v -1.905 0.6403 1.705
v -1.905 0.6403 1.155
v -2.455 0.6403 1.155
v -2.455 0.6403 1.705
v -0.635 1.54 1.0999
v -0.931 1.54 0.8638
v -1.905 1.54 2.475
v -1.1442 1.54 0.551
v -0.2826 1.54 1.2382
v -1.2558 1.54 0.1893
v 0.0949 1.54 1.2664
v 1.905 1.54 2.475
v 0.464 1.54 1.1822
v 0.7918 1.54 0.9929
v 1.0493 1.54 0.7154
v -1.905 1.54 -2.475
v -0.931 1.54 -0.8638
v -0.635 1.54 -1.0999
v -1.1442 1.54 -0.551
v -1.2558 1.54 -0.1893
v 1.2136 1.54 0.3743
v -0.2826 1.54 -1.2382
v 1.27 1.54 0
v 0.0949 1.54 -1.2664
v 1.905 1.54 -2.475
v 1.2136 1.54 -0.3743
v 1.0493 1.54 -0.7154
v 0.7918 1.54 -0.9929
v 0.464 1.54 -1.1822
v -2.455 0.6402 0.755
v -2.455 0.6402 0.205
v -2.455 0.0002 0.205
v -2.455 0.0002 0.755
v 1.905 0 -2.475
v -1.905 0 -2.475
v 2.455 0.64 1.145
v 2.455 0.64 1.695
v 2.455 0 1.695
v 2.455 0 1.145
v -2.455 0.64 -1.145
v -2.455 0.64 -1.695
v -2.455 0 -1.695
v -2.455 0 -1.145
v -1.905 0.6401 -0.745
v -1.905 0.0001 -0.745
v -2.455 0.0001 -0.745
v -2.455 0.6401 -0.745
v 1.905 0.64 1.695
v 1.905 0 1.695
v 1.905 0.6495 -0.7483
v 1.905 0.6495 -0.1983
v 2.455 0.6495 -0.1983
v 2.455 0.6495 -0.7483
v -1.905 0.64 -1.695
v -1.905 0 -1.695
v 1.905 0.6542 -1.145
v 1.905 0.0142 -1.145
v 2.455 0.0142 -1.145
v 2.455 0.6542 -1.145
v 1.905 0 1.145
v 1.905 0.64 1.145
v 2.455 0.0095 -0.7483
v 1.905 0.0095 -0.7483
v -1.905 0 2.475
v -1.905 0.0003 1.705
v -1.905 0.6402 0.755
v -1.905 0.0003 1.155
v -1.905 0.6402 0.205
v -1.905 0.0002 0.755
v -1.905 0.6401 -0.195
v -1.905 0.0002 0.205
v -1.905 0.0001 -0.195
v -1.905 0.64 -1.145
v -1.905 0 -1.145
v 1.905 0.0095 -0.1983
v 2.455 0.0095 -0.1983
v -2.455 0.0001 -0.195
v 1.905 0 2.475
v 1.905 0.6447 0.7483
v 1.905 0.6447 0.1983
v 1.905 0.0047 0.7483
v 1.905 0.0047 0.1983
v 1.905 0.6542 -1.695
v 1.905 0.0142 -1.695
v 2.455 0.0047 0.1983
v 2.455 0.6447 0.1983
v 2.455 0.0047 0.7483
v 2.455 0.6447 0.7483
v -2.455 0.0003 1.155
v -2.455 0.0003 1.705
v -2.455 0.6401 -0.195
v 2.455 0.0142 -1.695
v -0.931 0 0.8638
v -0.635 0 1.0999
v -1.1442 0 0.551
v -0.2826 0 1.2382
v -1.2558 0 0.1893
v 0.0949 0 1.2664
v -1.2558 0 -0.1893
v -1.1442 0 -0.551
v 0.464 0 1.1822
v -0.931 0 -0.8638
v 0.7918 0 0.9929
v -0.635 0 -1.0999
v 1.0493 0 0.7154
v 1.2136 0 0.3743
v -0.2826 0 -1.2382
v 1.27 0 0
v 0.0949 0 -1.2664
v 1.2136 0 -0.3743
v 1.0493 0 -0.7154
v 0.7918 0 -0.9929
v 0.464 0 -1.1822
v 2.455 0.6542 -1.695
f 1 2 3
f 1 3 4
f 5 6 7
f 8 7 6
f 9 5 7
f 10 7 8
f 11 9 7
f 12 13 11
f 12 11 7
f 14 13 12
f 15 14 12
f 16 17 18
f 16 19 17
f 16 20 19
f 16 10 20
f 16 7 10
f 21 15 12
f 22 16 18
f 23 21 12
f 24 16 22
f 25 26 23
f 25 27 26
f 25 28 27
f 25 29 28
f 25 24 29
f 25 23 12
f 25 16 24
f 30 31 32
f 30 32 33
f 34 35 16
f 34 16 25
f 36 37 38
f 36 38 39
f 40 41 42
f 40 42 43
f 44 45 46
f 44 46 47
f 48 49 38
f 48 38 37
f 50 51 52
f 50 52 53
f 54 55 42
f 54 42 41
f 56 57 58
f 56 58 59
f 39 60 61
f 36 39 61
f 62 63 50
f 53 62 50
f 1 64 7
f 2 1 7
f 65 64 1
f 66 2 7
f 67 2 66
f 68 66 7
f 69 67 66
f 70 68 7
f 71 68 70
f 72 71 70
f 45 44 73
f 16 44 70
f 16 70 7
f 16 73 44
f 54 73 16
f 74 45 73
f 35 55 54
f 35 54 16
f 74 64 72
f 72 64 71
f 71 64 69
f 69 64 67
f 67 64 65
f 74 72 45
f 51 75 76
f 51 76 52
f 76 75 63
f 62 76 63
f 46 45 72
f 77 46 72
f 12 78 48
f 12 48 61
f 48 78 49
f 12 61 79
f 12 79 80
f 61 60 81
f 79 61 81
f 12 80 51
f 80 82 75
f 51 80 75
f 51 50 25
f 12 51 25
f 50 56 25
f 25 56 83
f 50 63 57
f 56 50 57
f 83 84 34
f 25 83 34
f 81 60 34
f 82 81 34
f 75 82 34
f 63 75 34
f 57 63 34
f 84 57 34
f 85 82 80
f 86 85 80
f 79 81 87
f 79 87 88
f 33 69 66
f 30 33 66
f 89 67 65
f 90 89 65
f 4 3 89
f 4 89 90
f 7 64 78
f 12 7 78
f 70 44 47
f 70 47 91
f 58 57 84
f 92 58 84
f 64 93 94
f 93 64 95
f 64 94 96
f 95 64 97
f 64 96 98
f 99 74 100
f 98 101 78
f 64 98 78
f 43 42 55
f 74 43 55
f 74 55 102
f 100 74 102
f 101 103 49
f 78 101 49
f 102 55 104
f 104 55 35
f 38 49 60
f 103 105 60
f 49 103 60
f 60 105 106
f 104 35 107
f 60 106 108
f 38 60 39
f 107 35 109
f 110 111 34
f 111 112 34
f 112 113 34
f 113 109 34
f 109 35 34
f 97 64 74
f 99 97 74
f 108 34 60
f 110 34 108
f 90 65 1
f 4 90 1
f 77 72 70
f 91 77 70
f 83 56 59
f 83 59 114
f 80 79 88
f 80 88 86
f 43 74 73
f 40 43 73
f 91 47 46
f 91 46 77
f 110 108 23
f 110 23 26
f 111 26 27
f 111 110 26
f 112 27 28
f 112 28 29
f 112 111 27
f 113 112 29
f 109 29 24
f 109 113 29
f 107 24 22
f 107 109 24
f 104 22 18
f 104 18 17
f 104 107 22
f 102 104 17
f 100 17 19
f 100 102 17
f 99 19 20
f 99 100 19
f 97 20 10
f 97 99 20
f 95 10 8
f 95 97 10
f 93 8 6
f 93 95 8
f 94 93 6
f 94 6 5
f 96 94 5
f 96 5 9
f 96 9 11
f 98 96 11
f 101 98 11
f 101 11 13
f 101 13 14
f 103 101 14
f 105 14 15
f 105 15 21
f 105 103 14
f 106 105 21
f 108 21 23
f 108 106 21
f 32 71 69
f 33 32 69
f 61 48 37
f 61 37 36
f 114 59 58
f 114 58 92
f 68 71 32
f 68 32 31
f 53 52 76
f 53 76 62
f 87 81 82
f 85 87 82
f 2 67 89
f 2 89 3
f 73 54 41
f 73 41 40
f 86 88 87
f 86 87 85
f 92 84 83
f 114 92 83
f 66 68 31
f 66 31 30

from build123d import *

# Parameters (mm, degrees)
SKETCH1_W           = 3.81
SKETCH1_H           = 4.95
SKETCH1_R           = 1.27
BOSS_EXTRUDE1_DEPTH = 1.54
SKETCH2_W           = 0.55
SKETCH2_H           = 0.64
BOSS_EXTRUDE2_DEPTH = 0.55
SKETCH4_W           = 0.55
SKETCH4_H           = 0.64
BOSS_EXTRUDE3_DEPTH = 0.55


with BuildPart() as part:
    # Sketch1 → Boss-Extrude1 (new body)
    with BuildSketch(Plane(origin=(0, 0, 0), x_dir=(1, 0, 0), z_dir=(0, 1, 0))):
        Rectangle(SKETCH1_W, SKETCH1_H)
        Circle(SKETCH1_R, mode=Mode.SUBTRACT)
    extrude(amount=BOSS_EXTRUDE1_DEPTH)

    # Sketch2 → Boss-Extrude2 (add)
    with BuildSketch(Plane(origin=(1.905, 0, 0), x_dir=(0, 0, -1), z_dir=(1, 0, 0))):
        with Locations((-1.42, 0.32)):
            Rectangle(SKETCH2_W, SKETCH2_H)
        with Locations((-0.473333333, 0.324745647)):
            Rectangle(SKETCH2_W, SKETCH2_H)
        with Locations((0.473333333, 0.329491295)):
            Rectangle(SKETCH2_W, SKETCH2_H)
        with Locations((1.42, 0.334236942)):
            Rectangle(SKETCH2_W, SKETCH2_H)
    extrude(amount=BOSS_EXTRUDE2_DEPTH)

    # Sketch4 → Boss-Extrude3 (add)
    with BuildSketch(Plane.ZY.offset(1.905)):
        with Locations((-1.42, 0.32)):
            Rectangle(SKETCH4_W, SKETCH4_H)
        with Locations((-0.47, 0.320104449)):
            Rectangle(SKETCH4_W, SKETCH4_H)
        with Locations((0.48, 0.320208897)):
            Rectangle(SKETCH4_W, SKETCH4_H)
        with Locations((1.43, 0.320313346)):
            Rectangle(SKETCH4_W, SKETCH4_H)
    extrude(amount=BOSS_EXTRUDE3_DEPTH)


solid = part.part
